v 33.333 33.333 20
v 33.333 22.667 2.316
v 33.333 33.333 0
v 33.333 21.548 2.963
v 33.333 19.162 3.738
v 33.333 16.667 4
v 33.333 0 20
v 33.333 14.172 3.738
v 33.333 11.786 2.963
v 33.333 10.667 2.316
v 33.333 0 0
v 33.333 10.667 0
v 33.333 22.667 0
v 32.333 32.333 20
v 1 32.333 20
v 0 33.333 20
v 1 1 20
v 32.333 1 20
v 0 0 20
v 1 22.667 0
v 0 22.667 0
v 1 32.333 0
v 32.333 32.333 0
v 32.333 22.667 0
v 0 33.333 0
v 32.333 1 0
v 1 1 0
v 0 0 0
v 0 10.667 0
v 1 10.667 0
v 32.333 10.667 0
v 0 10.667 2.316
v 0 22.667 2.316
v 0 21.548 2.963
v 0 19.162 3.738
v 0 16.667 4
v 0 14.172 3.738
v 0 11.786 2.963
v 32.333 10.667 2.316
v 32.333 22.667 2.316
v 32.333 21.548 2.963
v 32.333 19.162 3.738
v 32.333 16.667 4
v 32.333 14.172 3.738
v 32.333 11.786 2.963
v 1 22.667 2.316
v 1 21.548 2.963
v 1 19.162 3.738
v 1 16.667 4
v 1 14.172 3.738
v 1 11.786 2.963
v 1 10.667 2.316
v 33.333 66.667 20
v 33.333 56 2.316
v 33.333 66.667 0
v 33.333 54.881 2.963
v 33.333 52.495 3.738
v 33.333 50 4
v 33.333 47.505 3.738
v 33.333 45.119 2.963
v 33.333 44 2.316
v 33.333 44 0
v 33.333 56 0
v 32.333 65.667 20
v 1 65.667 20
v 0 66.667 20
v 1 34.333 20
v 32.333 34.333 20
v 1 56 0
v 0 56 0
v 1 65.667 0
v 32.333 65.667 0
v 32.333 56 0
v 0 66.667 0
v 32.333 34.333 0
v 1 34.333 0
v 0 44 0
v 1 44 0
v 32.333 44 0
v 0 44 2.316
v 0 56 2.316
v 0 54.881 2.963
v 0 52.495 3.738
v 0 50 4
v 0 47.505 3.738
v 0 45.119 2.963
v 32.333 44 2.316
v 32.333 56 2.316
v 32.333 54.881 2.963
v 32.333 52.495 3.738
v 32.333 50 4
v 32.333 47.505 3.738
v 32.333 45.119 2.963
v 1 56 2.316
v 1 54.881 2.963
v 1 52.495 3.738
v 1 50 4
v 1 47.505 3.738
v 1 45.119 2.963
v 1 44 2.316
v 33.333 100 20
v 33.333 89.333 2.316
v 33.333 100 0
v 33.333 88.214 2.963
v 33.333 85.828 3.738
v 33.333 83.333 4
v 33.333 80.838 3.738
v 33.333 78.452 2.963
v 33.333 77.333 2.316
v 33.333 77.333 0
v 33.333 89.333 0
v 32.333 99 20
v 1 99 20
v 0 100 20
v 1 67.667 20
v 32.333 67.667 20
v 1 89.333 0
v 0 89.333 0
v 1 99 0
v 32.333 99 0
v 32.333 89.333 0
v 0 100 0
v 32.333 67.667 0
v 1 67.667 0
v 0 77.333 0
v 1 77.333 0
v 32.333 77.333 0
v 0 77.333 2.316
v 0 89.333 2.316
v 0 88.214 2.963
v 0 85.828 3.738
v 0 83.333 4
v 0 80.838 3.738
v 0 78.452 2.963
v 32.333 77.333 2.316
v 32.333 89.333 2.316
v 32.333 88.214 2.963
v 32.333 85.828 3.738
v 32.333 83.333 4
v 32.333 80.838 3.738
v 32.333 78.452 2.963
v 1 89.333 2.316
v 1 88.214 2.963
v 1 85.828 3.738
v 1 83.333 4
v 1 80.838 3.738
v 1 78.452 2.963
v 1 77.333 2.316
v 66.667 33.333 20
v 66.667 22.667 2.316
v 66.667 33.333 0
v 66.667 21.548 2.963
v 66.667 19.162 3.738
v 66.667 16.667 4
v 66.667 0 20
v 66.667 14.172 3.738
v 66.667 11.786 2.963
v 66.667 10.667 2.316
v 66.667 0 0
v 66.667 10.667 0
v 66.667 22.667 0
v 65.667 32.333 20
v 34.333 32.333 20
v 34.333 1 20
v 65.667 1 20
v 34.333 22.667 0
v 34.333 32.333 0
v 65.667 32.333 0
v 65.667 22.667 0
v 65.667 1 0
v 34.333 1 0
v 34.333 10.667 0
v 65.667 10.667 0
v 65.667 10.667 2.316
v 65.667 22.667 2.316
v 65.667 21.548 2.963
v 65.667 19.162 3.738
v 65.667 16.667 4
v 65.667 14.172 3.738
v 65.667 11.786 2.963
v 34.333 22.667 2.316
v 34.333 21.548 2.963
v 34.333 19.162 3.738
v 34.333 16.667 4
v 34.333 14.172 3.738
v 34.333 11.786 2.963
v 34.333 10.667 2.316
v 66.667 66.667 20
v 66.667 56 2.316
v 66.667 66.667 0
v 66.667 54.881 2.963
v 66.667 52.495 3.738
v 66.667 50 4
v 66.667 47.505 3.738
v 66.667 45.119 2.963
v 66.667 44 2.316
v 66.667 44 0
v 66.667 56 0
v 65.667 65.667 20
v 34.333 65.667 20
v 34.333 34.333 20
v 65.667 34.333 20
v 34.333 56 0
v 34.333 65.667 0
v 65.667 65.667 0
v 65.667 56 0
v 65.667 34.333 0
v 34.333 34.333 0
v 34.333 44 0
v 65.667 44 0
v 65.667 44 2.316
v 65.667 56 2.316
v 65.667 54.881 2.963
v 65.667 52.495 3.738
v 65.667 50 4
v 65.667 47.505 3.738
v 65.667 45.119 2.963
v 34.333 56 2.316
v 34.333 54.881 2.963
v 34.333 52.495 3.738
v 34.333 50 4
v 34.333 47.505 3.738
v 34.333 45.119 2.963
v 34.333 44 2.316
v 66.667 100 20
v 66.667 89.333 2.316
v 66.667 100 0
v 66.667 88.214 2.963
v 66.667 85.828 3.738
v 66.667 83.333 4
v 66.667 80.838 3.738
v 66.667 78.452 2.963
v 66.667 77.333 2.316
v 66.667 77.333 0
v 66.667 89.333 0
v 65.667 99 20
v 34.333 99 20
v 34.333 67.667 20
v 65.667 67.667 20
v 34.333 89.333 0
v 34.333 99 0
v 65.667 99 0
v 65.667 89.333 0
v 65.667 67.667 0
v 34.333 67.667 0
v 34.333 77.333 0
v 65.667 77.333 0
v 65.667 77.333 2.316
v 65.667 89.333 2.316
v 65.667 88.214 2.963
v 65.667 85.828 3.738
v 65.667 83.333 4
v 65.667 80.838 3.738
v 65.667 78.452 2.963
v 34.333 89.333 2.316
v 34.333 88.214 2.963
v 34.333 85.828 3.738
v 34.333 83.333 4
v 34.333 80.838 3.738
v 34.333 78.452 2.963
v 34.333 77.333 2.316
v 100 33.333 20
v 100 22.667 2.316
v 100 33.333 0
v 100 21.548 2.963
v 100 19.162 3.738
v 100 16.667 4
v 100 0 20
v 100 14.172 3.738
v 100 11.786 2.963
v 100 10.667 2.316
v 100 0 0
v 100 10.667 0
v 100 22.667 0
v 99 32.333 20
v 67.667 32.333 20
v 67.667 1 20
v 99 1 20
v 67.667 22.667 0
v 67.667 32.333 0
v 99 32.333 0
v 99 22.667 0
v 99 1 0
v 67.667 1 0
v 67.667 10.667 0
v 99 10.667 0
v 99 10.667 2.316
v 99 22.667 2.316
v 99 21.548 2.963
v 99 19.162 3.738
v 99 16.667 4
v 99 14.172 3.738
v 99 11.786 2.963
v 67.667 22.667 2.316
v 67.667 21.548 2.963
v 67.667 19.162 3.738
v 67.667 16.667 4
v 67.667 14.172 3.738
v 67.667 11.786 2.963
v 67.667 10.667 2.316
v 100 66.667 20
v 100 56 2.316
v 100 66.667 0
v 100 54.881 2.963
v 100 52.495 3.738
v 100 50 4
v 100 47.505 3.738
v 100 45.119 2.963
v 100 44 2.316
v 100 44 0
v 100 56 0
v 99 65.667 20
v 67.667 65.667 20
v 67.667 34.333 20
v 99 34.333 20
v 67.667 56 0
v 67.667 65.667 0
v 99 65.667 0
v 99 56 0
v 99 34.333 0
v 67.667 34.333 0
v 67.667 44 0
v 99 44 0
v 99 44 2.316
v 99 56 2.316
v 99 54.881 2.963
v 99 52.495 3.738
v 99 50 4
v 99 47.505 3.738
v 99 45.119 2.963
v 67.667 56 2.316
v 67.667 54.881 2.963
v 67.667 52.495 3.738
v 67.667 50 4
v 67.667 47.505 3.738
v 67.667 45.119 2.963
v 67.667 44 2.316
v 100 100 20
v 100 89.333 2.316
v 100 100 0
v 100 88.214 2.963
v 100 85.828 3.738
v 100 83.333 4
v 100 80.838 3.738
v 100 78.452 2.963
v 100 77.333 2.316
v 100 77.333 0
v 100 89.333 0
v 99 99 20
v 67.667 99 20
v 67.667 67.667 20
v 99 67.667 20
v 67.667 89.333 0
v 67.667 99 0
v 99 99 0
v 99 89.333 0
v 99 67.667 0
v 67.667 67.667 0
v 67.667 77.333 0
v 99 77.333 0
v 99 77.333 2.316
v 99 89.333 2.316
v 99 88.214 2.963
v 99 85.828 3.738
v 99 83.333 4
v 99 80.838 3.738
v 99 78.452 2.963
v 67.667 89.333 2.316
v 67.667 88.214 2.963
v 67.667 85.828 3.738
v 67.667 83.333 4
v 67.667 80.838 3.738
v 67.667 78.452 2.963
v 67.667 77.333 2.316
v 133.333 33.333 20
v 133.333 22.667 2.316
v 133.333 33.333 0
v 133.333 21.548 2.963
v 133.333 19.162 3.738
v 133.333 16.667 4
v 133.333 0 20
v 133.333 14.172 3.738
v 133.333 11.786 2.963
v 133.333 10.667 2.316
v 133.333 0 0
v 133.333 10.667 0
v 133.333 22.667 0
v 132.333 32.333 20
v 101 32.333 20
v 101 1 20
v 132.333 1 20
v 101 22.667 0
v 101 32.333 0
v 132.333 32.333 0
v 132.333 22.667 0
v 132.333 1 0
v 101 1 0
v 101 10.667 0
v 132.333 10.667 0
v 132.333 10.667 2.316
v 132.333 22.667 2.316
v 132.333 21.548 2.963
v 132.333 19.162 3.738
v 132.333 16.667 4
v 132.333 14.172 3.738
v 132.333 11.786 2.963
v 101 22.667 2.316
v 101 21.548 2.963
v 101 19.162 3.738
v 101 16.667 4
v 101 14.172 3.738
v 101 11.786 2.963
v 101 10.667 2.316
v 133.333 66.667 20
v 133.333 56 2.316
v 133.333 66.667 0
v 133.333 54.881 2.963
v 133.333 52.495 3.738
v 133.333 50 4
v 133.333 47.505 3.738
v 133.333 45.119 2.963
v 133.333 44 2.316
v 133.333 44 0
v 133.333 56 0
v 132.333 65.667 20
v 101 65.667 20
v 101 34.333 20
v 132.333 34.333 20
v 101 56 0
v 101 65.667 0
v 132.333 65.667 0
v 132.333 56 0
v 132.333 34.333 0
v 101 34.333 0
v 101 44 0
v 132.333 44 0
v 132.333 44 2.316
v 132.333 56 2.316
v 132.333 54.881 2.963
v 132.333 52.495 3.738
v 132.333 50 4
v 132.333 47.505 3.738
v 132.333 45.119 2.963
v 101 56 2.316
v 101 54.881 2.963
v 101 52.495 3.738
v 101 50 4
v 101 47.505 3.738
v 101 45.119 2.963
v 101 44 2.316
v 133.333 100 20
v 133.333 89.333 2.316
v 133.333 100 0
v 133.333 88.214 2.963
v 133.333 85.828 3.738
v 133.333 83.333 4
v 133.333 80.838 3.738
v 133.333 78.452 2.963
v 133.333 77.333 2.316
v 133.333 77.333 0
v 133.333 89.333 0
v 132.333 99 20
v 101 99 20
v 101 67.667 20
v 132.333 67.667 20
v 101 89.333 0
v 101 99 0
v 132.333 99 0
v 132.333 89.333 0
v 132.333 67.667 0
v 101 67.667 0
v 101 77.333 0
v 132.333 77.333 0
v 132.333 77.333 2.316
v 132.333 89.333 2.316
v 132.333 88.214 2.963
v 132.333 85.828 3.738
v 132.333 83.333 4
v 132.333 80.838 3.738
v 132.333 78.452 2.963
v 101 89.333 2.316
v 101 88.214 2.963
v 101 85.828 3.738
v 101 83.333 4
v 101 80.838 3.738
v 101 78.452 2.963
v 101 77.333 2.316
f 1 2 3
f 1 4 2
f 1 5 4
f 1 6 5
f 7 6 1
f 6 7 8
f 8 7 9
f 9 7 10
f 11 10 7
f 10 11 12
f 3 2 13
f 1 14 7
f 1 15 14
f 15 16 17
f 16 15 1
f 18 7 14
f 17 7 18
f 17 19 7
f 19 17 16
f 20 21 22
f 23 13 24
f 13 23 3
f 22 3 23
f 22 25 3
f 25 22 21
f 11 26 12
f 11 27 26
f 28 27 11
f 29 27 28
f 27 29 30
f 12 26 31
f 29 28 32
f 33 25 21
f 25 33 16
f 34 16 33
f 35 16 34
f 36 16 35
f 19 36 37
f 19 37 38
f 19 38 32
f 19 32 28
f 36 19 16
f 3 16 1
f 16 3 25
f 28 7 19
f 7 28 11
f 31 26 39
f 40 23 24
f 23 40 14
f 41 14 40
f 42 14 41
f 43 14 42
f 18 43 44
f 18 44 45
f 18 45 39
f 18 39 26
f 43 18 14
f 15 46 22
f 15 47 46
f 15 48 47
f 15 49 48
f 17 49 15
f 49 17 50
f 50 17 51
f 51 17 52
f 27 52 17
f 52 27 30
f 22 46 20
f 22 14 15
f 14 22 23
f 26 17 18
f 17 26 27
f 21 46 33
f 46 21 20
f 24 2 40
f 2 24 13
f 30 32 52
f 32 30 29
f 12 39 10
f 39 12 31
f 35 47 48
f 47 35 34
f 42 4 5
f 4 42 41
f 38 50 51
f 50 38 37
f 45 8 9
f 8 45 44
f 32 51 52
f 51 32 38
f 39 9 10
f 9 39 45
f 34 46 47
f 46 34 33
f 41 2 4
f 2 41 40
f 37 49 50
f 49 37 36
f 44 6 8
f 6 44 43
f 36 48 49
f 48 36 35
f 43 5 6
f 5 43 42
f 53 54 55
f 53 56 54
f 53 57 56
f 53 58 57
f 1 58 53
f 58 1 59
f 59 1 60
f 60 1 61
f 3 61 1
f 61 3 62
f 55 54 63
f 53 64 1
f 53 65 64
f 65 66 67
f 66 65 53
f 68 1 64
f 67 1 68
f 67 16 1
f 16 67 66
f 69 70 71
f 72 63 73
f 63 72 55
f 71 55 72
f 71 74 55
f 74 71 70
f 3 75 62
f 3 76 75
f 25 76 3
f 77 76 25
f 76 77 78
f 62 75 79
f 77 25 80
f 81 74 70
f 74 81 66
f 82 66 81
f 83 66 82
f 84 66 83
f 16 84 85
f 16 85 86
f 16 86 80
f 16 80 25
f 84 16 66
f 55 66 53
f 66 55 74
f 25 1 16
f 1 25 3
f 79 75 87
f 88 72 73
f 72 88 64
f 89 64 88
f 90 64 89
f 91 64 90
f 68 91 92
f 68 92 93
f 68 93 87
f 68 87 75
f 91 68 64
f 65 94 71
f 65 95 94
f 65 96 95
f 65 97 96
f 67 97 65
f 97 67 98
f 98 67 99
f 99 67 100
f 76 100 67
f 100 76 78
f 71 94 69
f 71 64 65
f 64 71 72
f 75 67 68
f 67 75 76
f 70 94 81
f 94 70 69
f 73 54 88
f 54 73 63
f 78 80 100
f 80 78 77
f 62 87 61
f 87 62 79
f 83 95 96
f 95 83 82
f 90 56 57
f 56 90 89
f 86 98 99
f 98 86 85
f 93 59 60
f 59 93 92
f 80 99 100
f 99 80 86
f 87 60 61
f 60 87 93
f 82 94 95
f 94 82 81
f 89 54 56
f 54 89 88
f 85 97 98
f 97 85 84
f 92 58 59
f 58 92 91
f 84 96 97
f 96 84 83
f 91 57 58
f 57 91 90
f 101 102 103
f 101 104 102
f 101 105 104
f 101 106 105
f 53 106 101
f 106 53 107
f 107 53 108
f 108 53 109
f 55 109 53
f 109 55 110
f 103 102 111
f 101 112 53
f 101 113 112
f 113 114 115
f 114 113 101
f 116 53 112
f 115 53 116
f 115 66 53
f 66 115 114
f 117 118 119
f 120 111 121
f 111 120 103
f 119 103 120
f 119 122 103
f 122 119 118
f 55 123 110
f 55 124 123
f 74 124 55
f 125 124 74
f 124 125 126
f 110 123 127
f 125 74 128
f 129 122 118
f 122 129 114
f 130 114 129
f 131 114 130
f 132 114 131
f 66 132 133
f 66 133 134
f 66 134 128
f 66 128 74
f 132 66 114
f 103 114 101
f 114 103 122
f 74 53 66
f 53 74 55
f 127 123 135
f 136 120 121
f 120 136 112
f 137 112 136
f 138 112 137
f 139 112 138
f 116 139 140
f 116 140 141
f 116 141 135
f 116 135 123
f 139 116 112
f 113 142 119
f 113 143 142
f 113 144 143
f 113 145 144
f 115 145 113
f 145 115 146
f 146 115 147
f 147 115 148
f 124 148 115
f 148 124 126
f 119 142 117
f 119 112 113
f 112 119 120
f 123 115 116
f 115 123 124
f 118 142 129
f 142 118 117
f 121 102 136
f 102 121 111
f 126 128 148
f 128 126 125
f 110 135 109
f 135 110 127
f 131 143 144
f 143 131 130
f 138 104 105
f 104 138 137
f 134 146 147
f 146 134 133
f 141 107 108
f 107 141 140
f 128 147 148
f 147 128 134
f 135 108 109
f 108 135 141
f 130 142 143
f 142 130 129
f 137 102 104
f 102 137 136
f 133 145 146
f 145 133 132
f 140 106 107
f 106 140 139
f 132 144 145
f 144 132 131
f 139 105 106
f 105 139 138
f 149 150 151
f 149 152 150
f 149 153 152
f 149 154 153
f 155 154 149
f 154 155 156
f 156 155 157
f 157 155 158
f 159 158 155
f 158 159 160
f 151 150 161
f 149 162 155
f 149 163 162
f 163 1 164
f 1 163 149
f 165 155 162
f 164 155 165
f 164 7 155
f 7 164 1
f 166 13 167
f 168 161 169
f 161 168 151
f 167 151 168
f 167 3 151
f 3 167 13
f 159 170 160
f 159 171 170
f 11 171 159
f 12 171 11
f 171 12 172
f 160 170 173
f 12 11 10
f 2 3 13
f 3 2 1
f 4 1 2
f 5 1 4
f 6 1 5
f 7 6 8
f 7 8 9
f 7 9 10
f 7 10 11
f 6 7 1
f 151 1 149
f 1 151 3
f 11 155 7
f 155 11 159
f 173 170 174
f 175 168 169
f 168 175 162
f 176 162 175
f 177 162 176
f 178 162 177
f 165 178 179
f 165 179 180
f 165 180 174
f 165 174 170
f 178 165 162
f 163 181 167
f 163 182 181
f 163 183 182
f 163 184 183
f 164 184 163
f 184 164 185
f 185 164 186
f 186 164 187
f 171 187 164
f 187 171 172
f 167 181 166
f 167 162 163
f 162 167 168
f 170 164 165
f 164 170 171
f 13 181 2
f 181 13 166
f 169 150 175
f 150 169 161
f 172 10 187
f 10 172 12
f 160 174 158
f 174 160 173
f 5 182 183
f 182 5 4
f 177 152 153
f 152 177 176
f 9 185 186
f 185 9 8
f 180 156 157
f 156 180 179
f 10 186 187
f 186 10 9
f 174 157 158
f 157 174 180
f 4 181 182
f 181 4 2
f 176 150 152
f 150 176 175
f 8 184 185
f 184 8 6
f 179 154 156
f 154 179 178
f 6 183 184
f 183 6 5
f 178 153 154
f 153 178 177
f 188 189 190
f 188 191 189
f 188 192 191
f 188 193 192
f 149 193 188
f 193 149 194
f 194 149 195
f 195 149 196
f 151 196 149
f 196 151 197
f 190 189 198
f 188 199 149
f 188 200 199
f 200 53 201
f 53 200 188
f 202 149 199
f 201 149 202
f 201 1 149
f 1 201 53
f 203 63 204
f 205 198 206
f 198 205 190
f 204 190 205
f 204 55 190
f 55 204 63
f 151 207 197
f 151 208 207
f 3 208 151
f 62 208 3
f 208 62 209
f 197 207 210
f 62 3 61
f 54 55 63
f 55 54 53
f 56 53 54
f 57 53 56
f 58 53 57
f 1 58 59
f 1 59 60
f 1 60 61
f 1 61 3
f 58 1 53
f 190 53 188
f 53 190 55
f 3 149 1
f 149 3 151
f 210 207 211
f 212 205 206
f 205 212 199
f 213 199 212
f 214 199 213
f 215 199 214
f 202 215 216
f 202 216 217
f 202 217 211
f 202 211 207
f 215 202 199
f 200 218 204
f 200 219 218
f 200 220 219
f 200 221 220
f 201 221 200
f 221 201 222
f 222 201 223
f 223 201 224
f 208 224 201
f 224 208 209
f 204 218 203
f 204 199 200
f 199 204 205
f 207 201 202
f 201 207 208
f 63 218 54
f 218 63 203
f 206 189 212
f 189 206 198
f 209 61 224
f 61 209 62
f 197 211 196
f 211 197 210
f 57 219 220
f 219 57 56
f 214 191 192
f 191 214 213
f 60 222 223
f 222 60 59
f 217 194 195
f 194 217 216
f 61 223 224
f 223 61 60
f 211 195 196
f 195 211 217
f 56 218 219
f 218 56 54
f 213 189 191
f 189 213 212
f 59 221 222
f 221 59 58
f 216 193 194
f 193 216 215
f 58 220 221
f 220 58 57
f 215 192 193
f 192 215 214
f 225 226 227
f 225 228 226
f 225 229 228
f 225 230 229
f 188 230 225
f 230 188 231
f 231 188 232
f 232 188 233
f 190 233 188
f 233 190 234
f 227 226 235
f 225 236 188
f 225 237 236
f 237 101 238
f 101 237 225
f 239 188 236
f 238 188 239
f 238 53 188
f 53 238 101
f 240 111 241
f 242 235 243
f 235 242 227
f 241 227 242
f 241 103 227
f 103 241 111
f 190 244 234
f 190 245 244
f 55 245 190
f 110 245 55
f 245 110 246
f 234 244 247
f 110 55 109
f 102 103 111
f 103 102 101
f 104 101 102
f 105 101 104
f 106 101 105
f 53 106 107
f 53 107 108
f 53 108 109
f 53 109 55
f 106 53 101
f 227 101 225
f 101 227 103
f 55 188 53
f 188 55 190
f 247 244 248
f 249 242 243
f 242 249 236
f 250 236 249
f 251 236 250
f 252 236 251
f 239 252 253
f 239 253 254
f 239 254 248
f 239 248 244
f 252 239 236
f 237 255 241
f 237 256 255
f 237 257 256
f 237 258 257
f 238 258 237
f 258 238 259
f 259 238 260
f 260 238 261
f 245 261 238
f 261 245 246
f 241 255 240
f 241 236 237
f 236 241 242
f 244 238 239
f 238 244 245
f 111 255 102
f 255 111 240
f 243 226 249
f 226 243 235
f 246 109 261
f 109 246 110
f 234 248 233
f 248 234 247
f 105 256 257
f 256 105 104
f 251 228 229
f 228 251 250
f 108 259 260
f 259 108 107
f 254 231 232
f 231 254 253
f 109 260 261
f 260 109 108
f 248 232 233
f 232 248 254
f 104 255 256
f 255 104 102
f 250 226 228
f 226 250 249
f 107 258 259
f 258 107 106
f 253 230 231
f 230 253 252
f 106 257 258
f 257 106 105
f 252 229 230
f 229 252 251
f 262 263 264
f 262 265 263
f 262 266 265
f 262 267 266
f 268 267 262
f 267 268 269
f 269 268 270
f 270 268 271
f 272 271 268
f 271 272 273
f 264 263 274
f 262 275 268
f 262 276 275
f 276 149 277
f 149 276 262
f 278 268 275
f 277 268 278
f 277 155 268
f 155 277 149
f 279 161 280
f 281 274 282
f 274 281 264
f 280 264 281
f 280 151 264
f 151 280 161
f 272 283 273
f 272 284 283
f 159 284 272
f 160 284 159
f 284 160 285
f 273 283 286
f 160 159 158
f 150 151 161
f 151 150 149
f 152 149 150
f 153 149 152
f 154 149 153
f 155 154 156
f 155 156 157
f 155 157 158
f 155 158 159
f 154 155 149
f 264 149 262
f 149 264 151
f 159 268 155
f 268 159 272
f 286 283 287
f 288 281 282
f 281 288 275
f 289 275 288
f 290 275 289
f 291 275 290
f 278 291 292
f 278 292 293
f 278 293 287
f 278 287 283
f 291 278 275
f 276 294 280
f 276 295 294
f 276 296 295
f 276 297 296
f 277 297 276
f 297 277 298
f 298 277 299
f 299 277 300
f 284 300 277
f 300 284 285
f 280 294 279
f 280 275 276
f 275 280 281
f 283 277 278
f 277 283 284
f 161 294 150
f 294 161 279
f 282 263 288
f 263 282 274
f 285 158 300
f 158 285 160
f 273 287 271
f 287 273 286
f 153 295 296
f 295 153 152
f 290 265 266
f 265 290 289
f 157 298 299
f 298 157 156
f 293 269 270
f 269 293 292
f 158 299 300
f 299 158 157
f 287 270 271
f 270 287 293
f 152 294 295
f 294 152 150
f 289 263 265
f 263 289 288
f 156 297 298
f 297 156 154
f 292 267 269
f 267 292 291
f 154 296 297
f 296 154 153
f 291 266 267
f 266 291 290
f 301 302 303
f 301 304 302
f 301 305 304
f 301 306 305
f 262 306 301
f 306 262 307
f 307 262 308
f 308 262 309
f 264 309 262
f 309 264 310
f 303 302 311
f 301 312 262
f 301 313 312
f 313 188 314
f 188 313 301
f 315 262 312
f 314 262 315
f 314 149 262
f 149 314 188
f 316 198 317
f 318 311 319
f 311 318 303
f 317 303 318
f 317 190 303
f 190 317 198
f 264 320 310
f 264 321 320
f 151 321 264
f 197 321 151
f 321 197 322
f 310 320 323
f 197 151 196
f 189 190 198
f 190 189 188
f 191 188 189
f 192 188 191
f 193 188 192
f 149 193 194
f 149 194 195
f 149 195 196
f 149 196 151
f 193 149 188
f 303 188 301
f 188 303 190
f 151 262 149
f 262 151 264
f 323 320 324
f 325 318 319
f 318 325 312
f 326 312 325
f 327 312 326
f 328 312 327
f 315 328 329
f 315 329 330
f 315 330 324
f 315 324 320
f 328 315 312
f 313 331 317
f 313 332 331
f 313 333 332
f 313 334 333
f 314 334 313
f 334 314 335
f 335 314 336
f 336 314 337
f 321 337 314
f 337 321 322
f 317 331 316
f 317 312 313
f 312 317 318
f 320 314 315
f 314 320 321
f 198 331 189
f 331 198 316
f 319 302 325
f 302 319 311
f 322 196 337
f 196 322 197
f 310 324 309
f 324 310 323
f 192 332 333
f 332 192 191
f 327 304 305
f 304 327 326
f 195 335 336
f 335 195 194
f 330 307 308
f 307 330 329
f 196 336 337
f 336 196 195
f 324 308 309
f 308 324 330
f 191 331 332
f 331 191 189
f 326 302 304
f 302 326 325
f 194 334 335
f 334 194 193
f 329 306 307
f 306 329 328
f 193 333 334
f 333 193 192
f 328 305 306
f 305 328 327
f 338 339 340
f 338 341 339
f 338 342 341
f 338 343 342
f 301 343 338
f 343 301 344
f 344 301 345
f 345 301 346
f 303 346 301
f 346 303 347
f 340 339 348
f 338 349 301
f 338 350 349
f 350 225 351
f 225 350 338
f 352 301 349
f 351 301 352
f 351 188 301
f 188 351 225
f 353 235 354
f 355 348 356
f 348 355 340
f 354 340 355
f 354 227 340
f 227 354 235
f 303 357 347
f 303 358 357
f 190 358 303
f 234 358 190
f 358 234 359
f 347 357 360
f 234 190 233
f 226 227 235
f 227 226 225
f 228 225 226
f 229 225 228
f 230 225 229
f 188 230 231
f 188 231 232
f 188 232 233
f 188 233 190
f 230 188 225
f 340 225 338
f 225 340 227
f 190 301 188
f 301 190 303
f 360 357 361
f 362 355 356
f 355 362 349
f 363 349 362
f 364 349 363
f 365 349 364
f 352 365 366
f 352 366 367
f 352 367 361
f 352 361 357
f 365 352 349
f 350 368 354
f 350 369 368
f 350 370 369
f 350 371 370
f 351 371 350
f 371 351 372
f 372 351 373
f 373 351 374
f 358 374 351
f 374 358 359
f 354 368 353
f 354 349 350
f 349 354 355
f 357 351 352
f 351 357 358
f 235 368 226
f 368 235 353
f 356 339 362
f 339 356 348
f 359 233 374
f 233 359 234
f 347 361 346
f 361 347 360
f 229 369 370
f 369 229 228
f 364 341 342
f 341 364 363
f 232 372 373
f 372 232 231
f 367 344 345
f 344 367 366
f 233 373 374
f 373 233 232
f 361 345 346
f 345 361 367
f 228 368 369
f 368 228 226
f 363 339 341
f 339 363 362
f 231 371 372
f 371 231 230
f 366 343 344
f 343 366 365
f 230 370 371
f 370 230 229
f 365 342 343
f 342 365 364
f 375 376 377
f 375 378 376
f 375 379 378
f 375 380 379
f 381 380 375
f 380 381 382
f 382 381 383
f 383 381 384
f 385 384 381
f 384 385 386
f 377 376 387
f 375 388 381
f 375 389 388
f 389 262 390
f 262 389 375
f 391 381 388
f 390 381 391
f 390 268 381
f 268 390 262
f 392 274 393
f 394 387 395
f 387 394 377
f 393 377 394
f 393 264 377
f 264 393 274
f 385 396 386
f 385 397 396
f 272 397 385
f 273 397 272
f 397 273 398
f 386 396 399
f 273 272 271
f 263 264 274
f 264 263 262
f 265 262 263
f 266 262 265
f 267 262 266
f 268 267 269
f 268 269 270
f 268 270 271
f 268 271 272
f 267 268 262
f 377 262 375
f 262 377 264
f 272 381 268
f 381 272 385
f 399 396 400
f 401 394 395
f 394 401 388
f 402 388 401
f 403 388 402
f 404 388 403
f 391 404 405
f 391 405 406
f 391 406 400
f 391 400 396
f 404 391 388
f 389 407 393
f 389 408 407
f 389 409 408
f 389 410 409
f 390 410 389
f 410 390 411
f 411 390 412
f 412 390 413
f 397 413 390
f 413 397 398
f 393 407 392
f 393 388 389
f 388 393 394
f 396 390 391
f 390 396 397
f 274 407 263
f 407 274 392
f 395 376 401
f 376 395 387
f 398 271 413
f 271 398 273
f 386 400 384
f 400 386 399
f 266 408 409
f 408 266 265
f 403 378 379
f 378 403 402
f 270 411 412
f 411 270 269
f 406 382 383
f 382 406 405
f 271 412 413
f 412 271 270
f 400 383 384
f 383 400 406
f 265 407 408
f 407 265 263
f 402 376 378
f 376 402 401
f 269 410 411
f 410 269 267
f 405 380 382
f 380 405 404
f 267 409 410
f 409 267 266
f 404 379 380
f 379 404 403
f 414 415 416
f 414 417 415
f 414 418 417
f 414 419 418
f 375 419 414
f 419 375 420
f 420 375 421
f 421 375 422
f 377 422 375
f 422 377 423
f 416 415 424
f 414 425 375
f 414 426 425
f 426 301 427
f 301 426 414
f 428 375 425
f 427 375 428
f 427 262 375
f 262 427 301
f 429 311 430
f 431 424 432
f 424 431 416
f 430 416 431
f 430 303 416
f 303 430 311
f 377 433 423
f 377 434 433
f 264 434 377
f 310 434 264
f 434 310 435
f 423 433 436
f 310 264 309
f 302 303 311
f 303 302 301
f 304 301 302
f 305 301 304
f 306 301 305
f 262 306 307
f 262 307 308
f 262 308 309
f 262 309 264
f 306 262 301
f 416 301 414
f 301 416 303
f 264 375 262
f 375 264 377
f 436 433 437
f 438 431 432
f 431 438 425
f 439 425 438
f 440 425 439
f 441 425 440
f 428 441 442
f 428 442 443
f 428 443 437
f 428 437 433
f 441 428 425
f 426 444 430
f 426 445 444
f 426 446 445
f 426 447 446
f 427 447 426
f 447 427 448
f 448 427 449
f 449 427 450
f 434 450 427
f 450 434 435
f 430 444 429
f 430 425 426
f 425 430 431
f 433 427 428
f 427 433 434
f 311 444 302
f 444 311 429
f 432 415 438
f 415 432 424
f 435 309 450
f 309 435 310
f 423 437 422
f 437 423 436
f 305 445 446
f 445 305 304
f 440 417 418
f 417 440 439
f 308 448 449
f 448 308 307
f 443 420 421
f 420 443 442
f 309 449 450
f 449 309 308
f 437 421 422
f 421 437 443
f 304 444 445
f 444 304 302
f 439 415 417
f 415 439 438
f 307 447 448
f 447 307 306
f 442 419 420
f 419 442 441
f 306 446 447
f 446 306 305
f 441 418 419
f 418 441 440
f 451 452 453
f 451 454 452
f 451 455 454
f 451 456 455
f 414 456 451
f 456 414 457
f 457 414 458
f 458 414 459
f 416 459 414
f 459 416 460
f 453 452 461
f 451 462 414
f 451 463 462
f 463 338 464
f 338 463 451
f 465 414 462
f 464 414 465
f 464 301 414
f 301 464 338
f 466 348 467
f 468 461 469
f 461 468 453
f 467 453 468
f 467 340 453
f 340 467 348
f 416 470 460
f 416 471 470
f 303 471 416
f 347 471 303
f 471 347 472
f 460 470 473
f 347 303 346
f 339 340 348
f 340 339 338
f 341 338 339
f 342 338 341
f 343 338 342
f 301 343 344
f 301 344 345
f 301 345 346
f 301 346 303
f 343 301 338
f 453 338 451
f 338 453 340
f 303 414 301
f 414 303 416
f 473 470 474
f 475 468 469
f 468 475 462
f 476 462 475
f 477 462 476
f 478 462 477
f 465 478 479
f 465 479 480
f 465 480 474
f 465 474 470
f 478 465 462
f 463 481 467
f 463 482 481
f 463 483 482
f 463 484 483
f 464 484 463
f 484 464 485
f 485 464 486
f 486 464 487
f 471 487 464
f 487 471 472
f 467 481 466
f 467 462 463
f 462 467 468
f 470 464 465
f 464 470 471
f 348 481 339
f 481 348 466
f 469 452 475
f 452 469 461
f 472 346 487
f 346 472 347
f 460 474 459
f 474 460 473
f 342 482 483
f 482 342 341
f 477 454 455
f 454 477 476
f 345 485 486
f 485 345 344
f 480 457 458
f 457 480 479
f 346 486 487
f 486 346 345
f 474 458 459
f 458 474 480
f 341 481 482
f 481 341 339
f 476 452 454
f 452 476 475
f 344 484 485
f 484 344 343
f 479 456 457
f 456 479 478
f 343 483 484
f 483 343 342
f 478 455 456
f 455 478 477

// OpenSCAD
/*
OpenSCAD script to create square pockets to run LED strips below.
Funnels the light towards a semi-translucent surface such as white acrylic glass
Hint: Print this with non-translucent, rather dark PLA/ABS/resin, then paint it white

By n0ctua https://github.com/n0ctu/
*/


// Define parameters

led_num_x = 4;             // amount, as many as your printer can take
led_num_y = 3;             // amount

led_cell_x = 1000/30;      // mm, 30 LEDs per meter in my case
led_cell_y = led_cell_x;   // mm, same as led_cell_x to make them square
panel_height = 20;         // mm, just about high enough to illuminate the whole top surface
bezel_width = 2;           // mm, trade off: solidity / narrow bezels

strip_pocket_height = 4;   // mm, height of the pocket to run an LED strip
strip_pocket_width = 12;   // mm, width of your strip
strip_pocket_radius = 12;  // mm, Radius of the rounded top of the cable pocket


// LED cells
module led_cell() {
    pocket_x = led_cell_x - bezel_width;
    pocket_y = led_cell_y - bezel_width;
    pocket_z = panel_height + 2;
    
    difference() {
        cube([led_cell_x, led_cell_y, panel_height]);
        translate([bezel_width / 2, bezel_width / 2, -1]) {
            cube([pocket_x, pocket_y, pocket_z]);
        }
    }
}

// LED strip pockets
module strip_pocket() {
    translate([led_cell_x / 2, led_cell_y / 2, 0]) {
        intersection() {
            translate([0, 0, strip_pocket_height / 2])
                cube([led_cell_x + 1, strip_pocket_width, strip_pocket_height], center=true);
            rotate([0,90,0]) {
            translate([strip_pocket_radius - strip_pocket_height, 0, 0])
                cylinder(h = led_cell_x + 1, r = strip_pocket_radius, center=true);
            }
        }
    }
}

// Assemble the whole thing
for (x = [1 : led_num_x]) {
    for (y = [1 : led_num_y]) {
        translate([(x - 1) * led_cell_x, (y - 1) * led_cell_y, 0]) {
            difference() {
                led_cell();
                strip_pocket();
            }
        }
    }
}
